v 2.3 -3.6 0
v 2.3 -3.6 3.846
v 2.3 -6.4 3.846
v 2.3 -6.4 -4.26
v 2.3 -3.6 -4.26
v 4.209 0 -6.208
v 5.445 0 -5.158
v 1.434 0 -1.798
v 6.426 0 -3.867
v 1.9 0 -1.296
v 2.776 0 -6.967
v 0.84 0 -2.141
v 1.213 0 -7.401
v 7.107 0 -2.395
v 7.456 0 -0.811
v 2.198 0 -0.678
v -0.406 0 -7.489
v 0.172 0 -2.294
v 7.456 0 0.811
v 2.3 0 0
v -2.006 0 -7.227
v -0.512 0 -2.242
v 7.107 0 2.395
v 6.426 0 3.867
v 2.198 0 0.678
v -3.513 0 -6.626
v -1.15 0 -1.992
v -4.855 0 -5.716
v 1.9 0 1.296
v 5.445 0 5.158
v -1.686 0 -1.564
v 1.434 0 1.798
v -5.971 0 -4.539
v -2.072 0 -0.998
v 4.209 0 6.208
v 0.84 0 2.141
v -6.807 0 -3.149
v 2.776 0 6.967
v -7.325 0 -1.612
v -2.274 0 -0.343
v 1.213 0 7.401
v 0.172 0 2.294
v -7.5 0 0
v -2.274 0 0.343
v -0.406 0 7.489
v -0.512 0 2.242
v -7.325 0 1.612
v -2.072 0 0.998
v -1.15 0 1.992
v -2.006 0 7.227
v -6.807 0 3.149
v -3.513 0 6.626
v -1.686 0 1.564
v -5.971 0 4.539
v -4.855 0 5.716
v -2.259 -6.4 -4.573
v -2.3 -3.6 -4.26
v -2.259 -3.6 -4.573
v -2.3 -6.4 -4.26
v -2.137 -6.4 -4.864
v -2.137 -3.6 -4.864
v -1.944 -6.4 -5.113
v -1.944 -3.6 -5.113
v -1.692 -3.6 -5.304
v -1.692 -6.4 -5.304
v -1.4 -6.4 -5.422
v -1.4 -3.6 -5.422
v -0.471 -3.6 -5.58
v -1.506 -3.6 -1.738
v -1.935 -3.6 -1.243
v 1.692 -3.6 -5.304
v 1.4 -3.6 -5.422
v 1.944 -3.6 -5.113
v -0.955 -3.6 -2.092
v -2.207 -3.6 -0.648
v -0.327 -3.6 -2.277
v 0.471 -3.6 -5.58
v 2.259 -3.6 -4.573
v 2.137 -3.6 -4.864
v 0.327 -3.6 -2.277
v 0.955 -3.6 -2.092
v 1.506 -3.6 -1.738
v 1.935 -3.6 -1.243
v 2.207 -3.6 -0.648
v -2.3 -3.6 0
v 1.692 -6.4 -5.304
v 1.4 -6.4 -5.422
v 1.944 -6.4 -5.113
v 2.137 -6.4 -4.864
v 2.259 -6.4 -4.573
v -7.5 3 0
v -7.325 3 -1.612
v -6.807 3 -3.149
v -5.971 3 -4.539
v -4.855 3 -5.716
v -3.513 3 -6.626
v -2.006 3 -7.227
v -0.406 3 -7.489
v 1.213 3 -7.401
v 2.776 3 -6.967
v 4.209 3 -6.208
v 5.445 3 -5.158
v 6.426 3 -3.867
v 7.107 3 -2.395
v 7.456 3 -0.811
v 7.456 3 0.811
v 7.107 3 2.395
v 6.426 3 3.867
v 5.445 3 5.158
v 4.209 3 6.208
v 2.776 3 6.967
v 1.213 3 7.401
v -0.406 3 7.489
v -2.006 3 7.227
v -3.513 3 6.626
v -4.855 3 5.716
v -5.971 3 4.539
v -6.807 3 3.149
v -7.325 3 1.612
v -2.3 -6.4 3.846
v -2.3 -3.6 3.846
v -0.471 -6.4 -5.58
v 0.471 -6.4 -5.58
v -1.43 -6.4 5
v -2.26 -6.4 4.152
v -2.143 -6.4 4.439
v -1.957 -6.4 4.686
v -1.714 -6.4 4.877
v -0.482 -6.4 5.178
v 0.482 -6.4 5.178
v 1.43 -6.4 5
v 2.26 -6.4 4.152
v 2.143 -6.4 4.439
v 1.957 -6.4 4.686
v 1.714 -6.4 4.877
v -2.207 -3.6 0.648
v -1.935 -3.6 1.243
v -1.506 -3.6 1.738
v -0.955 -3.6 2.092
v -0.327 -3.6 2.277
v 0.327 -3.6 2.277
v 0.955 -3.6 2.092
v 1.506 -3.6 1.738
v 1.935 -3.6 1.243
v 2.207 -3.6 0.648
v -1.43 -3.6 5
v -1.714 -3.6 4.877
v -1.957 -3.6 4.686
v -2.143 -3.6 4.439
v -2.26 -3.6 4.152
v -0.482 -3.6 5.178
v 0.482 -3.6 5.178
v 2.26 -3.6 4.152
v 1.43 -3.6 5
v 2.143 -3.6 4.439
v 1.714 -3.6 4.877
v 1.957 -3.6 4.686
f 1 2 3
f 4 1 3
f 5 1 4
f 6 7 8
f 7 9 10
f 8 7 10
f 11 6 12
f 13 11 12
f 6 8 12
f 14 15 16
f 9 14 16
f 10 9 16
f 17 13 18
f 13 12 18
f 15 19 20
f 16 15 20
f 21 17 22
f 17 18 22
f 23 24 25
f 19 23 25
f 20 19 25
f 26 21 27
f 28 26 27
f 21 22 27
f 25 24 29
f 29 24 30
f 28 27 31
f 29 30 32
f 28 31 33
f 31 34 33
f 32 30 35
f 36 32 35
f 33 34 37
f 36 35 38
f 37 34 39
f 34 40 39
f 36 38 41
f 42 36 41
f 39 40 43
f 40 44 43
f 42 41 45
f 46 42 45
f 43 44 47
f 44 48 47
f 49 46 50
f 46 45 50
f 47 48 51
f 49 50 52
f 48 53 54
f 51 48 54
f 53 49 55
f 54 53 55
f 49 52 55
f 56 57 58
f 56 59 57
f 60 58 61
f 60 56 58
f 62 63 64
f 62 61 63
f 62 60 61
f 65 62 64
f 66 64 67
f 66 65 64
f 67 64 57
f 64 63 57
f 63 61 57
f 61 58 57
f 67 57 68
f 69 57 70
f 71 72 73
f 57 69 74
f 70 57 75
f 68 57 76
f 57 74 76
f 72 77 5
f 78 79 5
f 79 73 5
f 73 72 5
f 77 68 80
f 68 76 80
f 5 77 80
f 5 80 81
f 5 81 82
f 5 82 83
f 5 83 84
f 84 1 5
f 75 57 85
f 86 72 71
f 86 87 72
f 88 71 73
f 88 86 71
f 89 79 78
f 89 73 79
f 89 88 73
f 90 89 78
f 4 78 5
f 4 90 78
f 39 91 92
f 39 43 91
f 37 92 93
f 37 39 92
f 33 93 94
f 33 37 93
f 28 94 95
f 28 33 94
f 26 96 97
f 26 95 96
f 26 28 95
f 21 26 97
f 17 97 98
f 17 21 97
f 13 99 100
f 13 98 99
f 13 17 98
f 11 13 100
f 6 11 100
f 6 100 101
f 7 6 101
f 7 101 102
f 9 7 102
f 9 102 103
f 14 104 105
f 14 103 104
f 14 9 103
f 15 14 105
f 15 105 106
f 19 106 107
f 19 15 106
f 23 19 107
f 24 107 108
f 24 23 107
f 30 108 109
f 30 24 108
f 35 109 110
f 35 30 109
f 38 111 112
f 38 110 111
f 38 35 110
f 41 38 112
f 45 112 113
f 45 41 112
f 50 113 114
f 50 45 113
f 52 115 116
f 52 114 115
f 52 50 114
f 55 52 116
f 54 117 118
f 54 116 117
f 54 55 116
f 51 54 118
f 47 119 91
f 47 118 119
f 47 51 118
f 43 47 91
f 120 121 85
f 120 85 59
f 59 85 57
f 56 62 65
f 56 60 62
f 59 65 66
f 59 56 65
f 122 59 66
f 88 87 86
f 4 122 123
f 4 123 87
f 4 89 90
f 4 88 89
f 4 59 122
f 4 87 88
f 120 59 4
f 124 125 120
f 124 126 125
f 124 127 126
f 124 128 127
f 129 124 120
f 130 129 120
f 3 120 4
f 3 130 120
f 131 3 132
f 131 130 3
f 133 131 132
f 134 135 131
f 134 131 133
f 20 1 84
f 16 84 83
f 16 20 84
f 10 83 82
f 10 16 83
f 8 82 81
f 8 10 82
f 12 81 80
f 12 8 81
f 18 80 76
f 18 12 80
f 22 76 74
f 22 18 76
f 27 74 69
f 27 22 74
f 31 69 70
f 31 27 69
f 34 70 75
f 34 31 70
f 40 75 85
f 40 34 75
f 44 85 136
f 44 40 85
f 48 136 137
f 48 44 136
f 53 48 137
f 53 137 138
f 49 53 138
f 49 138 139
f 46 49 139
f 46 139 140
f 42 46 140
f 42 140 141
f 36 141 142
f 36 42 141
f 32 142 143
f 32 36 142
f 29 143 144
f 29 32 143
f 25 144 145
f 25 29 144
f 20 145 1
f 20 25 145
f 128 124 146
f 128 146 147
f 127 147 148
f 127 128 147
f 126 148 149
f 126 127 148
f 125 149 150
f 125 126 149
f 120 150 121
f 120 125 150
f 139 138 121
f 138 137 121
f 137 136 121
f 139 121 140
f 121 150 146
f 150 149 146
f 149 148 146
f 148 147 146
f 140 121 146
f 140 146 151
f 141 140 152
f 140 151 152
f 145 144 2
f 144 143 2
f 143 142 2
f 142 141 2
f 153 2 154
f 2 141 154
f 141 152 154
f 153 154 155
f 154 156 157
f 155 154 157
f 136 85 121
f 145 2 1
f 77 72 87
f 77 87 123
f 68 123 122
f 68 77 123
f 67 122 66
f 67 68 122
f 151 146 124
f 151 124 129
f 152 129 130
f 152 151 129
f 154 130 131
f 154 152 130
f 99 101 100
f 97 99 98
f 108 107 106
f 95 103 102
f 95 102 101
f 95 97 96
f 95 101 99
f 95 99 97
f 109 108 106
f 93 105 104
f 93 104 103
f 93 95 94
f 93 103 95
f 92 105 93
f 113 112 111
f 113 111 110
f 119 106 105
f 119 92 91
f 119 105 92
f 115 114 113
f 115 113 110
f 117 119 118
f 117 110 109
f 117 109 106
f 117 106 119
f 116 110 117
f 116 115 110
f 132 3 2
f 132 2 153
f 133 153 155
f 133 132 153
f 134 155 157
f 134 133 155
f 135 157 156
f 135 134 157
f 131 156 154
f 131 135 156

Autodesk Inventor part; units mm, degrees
ref_plane "YZ Plane" through (0, 0, 0) normal (1, 0, 0) x (0, 1, 0)
ref_plane "XZ Plane" through (0, 0, 0) normal (0, 1, 0) x (-1, 0, 0)
ref_plane "XY Plane" through (0, 0, 0) normal (0, 0, 1) x (1, 0, 0)
sketch "Sketch1" plane through (0, 0, 0) normal (0, 1, 0) x (-1, 0, 0)
  circle A0 centre (0, 0) radius 7.5
  dimension "d0" = 15
extrude "Extrusion1" add sketch "Sketch1" along normal blind 3
sketch "Sketch2" plane through (0, 0, 0) normal (0, -1, 0) x (1, 0, 0)
  circle A0 centre (0, 0) radius 7.5 projected
  circle A1 centre (0, 0) radius 2.3
  dimension "d3" = 4.6
extrude "Extrusion2" add sketch "Sketch2" along normal blind 3.6 contours A1
sketch "Sketch3" plane through (0, -3.6, 0) normal (0, -1, 0) x (1, 0, 0)
  circle A0 centre (0, 0) radius 2.3 projected
  line L0 (-2.3, 4.6637) -> (-2.3, -5.1059)
  line L1 (2.3, 4.6637) -> (2.3, -5.1059)
  line L2 (0, 15.7328) -> (0, -15.032) construction
  circle A1 centre (0, 0) radius 7.5 construction
  arc A2 (-3, 6.8739) -> (-3, -6.8739) centre (0, 0) ccw construction
  arc A3 (3, -6.8739) -> (3, 6.8739) centre (0, 0) ccw construction
  arc A4 (2.3, 4.6637) -> (-2.3, 4.6637) centre (0, 0) ccw
  arc A5 (-2.3, -5.1059) -> (2.3, -5.1059) centre (0, 0) ccw
  dimension "d13" = 5.2
  dimension "d19" = 5.6
extrude "Extrusion3" add sketch "Sketch3" along normal blind 2.8
fillet "Fillet2" radius 1.2 4 edges at (-2.3, -5, 4.6637) (2.3, -5, 4.6637) (-2.3, -5, -5.1059) (2.3, -5, -5.1059)
equation "\"d0\" = HeadConnectorOuterSize"
equation "\"d1\" = EarConnectorHeight"
equation "\"d3\" = HeadConnectorWidth - HeadConnectorTolerance"
equation "\"d4\" = HeadConnectorOuterHeight + 3 * HeadConnectorTolerance"
equation "\"d13\" = 0.5 * HeadConnectorDiam - 4 * HeadConnectorTolerance"
equation "\"d19\" = 0.5 * HeadConnectorDiam - 2 * HeadConnectorTolerance"
equation "\"d10\" = HeadConnectorHeight - HeadConnectorTolerance"
equation "\"d20\" = 2 * HeadConnectorProportion"
equation "\"EarConnectorHeight\" = 5 * HeadConnectorProportion"
equation "\"HeadConnectorOuterSize\" = 15"
equation "\"HeadConnectorWidth\" = 4.8"
equation "\"HeadConnectorTolerance\" = 0.2"
equation "\"HeadConnectorOuterHeight\" = 3"
equation "\"HeadConnectorDiam\" = 12"
equation "\"HeadConnectorHeight\" = 3"
equation "\"HeadConnectorProportion\" = 0.6"
properties part number "EarConnector"
